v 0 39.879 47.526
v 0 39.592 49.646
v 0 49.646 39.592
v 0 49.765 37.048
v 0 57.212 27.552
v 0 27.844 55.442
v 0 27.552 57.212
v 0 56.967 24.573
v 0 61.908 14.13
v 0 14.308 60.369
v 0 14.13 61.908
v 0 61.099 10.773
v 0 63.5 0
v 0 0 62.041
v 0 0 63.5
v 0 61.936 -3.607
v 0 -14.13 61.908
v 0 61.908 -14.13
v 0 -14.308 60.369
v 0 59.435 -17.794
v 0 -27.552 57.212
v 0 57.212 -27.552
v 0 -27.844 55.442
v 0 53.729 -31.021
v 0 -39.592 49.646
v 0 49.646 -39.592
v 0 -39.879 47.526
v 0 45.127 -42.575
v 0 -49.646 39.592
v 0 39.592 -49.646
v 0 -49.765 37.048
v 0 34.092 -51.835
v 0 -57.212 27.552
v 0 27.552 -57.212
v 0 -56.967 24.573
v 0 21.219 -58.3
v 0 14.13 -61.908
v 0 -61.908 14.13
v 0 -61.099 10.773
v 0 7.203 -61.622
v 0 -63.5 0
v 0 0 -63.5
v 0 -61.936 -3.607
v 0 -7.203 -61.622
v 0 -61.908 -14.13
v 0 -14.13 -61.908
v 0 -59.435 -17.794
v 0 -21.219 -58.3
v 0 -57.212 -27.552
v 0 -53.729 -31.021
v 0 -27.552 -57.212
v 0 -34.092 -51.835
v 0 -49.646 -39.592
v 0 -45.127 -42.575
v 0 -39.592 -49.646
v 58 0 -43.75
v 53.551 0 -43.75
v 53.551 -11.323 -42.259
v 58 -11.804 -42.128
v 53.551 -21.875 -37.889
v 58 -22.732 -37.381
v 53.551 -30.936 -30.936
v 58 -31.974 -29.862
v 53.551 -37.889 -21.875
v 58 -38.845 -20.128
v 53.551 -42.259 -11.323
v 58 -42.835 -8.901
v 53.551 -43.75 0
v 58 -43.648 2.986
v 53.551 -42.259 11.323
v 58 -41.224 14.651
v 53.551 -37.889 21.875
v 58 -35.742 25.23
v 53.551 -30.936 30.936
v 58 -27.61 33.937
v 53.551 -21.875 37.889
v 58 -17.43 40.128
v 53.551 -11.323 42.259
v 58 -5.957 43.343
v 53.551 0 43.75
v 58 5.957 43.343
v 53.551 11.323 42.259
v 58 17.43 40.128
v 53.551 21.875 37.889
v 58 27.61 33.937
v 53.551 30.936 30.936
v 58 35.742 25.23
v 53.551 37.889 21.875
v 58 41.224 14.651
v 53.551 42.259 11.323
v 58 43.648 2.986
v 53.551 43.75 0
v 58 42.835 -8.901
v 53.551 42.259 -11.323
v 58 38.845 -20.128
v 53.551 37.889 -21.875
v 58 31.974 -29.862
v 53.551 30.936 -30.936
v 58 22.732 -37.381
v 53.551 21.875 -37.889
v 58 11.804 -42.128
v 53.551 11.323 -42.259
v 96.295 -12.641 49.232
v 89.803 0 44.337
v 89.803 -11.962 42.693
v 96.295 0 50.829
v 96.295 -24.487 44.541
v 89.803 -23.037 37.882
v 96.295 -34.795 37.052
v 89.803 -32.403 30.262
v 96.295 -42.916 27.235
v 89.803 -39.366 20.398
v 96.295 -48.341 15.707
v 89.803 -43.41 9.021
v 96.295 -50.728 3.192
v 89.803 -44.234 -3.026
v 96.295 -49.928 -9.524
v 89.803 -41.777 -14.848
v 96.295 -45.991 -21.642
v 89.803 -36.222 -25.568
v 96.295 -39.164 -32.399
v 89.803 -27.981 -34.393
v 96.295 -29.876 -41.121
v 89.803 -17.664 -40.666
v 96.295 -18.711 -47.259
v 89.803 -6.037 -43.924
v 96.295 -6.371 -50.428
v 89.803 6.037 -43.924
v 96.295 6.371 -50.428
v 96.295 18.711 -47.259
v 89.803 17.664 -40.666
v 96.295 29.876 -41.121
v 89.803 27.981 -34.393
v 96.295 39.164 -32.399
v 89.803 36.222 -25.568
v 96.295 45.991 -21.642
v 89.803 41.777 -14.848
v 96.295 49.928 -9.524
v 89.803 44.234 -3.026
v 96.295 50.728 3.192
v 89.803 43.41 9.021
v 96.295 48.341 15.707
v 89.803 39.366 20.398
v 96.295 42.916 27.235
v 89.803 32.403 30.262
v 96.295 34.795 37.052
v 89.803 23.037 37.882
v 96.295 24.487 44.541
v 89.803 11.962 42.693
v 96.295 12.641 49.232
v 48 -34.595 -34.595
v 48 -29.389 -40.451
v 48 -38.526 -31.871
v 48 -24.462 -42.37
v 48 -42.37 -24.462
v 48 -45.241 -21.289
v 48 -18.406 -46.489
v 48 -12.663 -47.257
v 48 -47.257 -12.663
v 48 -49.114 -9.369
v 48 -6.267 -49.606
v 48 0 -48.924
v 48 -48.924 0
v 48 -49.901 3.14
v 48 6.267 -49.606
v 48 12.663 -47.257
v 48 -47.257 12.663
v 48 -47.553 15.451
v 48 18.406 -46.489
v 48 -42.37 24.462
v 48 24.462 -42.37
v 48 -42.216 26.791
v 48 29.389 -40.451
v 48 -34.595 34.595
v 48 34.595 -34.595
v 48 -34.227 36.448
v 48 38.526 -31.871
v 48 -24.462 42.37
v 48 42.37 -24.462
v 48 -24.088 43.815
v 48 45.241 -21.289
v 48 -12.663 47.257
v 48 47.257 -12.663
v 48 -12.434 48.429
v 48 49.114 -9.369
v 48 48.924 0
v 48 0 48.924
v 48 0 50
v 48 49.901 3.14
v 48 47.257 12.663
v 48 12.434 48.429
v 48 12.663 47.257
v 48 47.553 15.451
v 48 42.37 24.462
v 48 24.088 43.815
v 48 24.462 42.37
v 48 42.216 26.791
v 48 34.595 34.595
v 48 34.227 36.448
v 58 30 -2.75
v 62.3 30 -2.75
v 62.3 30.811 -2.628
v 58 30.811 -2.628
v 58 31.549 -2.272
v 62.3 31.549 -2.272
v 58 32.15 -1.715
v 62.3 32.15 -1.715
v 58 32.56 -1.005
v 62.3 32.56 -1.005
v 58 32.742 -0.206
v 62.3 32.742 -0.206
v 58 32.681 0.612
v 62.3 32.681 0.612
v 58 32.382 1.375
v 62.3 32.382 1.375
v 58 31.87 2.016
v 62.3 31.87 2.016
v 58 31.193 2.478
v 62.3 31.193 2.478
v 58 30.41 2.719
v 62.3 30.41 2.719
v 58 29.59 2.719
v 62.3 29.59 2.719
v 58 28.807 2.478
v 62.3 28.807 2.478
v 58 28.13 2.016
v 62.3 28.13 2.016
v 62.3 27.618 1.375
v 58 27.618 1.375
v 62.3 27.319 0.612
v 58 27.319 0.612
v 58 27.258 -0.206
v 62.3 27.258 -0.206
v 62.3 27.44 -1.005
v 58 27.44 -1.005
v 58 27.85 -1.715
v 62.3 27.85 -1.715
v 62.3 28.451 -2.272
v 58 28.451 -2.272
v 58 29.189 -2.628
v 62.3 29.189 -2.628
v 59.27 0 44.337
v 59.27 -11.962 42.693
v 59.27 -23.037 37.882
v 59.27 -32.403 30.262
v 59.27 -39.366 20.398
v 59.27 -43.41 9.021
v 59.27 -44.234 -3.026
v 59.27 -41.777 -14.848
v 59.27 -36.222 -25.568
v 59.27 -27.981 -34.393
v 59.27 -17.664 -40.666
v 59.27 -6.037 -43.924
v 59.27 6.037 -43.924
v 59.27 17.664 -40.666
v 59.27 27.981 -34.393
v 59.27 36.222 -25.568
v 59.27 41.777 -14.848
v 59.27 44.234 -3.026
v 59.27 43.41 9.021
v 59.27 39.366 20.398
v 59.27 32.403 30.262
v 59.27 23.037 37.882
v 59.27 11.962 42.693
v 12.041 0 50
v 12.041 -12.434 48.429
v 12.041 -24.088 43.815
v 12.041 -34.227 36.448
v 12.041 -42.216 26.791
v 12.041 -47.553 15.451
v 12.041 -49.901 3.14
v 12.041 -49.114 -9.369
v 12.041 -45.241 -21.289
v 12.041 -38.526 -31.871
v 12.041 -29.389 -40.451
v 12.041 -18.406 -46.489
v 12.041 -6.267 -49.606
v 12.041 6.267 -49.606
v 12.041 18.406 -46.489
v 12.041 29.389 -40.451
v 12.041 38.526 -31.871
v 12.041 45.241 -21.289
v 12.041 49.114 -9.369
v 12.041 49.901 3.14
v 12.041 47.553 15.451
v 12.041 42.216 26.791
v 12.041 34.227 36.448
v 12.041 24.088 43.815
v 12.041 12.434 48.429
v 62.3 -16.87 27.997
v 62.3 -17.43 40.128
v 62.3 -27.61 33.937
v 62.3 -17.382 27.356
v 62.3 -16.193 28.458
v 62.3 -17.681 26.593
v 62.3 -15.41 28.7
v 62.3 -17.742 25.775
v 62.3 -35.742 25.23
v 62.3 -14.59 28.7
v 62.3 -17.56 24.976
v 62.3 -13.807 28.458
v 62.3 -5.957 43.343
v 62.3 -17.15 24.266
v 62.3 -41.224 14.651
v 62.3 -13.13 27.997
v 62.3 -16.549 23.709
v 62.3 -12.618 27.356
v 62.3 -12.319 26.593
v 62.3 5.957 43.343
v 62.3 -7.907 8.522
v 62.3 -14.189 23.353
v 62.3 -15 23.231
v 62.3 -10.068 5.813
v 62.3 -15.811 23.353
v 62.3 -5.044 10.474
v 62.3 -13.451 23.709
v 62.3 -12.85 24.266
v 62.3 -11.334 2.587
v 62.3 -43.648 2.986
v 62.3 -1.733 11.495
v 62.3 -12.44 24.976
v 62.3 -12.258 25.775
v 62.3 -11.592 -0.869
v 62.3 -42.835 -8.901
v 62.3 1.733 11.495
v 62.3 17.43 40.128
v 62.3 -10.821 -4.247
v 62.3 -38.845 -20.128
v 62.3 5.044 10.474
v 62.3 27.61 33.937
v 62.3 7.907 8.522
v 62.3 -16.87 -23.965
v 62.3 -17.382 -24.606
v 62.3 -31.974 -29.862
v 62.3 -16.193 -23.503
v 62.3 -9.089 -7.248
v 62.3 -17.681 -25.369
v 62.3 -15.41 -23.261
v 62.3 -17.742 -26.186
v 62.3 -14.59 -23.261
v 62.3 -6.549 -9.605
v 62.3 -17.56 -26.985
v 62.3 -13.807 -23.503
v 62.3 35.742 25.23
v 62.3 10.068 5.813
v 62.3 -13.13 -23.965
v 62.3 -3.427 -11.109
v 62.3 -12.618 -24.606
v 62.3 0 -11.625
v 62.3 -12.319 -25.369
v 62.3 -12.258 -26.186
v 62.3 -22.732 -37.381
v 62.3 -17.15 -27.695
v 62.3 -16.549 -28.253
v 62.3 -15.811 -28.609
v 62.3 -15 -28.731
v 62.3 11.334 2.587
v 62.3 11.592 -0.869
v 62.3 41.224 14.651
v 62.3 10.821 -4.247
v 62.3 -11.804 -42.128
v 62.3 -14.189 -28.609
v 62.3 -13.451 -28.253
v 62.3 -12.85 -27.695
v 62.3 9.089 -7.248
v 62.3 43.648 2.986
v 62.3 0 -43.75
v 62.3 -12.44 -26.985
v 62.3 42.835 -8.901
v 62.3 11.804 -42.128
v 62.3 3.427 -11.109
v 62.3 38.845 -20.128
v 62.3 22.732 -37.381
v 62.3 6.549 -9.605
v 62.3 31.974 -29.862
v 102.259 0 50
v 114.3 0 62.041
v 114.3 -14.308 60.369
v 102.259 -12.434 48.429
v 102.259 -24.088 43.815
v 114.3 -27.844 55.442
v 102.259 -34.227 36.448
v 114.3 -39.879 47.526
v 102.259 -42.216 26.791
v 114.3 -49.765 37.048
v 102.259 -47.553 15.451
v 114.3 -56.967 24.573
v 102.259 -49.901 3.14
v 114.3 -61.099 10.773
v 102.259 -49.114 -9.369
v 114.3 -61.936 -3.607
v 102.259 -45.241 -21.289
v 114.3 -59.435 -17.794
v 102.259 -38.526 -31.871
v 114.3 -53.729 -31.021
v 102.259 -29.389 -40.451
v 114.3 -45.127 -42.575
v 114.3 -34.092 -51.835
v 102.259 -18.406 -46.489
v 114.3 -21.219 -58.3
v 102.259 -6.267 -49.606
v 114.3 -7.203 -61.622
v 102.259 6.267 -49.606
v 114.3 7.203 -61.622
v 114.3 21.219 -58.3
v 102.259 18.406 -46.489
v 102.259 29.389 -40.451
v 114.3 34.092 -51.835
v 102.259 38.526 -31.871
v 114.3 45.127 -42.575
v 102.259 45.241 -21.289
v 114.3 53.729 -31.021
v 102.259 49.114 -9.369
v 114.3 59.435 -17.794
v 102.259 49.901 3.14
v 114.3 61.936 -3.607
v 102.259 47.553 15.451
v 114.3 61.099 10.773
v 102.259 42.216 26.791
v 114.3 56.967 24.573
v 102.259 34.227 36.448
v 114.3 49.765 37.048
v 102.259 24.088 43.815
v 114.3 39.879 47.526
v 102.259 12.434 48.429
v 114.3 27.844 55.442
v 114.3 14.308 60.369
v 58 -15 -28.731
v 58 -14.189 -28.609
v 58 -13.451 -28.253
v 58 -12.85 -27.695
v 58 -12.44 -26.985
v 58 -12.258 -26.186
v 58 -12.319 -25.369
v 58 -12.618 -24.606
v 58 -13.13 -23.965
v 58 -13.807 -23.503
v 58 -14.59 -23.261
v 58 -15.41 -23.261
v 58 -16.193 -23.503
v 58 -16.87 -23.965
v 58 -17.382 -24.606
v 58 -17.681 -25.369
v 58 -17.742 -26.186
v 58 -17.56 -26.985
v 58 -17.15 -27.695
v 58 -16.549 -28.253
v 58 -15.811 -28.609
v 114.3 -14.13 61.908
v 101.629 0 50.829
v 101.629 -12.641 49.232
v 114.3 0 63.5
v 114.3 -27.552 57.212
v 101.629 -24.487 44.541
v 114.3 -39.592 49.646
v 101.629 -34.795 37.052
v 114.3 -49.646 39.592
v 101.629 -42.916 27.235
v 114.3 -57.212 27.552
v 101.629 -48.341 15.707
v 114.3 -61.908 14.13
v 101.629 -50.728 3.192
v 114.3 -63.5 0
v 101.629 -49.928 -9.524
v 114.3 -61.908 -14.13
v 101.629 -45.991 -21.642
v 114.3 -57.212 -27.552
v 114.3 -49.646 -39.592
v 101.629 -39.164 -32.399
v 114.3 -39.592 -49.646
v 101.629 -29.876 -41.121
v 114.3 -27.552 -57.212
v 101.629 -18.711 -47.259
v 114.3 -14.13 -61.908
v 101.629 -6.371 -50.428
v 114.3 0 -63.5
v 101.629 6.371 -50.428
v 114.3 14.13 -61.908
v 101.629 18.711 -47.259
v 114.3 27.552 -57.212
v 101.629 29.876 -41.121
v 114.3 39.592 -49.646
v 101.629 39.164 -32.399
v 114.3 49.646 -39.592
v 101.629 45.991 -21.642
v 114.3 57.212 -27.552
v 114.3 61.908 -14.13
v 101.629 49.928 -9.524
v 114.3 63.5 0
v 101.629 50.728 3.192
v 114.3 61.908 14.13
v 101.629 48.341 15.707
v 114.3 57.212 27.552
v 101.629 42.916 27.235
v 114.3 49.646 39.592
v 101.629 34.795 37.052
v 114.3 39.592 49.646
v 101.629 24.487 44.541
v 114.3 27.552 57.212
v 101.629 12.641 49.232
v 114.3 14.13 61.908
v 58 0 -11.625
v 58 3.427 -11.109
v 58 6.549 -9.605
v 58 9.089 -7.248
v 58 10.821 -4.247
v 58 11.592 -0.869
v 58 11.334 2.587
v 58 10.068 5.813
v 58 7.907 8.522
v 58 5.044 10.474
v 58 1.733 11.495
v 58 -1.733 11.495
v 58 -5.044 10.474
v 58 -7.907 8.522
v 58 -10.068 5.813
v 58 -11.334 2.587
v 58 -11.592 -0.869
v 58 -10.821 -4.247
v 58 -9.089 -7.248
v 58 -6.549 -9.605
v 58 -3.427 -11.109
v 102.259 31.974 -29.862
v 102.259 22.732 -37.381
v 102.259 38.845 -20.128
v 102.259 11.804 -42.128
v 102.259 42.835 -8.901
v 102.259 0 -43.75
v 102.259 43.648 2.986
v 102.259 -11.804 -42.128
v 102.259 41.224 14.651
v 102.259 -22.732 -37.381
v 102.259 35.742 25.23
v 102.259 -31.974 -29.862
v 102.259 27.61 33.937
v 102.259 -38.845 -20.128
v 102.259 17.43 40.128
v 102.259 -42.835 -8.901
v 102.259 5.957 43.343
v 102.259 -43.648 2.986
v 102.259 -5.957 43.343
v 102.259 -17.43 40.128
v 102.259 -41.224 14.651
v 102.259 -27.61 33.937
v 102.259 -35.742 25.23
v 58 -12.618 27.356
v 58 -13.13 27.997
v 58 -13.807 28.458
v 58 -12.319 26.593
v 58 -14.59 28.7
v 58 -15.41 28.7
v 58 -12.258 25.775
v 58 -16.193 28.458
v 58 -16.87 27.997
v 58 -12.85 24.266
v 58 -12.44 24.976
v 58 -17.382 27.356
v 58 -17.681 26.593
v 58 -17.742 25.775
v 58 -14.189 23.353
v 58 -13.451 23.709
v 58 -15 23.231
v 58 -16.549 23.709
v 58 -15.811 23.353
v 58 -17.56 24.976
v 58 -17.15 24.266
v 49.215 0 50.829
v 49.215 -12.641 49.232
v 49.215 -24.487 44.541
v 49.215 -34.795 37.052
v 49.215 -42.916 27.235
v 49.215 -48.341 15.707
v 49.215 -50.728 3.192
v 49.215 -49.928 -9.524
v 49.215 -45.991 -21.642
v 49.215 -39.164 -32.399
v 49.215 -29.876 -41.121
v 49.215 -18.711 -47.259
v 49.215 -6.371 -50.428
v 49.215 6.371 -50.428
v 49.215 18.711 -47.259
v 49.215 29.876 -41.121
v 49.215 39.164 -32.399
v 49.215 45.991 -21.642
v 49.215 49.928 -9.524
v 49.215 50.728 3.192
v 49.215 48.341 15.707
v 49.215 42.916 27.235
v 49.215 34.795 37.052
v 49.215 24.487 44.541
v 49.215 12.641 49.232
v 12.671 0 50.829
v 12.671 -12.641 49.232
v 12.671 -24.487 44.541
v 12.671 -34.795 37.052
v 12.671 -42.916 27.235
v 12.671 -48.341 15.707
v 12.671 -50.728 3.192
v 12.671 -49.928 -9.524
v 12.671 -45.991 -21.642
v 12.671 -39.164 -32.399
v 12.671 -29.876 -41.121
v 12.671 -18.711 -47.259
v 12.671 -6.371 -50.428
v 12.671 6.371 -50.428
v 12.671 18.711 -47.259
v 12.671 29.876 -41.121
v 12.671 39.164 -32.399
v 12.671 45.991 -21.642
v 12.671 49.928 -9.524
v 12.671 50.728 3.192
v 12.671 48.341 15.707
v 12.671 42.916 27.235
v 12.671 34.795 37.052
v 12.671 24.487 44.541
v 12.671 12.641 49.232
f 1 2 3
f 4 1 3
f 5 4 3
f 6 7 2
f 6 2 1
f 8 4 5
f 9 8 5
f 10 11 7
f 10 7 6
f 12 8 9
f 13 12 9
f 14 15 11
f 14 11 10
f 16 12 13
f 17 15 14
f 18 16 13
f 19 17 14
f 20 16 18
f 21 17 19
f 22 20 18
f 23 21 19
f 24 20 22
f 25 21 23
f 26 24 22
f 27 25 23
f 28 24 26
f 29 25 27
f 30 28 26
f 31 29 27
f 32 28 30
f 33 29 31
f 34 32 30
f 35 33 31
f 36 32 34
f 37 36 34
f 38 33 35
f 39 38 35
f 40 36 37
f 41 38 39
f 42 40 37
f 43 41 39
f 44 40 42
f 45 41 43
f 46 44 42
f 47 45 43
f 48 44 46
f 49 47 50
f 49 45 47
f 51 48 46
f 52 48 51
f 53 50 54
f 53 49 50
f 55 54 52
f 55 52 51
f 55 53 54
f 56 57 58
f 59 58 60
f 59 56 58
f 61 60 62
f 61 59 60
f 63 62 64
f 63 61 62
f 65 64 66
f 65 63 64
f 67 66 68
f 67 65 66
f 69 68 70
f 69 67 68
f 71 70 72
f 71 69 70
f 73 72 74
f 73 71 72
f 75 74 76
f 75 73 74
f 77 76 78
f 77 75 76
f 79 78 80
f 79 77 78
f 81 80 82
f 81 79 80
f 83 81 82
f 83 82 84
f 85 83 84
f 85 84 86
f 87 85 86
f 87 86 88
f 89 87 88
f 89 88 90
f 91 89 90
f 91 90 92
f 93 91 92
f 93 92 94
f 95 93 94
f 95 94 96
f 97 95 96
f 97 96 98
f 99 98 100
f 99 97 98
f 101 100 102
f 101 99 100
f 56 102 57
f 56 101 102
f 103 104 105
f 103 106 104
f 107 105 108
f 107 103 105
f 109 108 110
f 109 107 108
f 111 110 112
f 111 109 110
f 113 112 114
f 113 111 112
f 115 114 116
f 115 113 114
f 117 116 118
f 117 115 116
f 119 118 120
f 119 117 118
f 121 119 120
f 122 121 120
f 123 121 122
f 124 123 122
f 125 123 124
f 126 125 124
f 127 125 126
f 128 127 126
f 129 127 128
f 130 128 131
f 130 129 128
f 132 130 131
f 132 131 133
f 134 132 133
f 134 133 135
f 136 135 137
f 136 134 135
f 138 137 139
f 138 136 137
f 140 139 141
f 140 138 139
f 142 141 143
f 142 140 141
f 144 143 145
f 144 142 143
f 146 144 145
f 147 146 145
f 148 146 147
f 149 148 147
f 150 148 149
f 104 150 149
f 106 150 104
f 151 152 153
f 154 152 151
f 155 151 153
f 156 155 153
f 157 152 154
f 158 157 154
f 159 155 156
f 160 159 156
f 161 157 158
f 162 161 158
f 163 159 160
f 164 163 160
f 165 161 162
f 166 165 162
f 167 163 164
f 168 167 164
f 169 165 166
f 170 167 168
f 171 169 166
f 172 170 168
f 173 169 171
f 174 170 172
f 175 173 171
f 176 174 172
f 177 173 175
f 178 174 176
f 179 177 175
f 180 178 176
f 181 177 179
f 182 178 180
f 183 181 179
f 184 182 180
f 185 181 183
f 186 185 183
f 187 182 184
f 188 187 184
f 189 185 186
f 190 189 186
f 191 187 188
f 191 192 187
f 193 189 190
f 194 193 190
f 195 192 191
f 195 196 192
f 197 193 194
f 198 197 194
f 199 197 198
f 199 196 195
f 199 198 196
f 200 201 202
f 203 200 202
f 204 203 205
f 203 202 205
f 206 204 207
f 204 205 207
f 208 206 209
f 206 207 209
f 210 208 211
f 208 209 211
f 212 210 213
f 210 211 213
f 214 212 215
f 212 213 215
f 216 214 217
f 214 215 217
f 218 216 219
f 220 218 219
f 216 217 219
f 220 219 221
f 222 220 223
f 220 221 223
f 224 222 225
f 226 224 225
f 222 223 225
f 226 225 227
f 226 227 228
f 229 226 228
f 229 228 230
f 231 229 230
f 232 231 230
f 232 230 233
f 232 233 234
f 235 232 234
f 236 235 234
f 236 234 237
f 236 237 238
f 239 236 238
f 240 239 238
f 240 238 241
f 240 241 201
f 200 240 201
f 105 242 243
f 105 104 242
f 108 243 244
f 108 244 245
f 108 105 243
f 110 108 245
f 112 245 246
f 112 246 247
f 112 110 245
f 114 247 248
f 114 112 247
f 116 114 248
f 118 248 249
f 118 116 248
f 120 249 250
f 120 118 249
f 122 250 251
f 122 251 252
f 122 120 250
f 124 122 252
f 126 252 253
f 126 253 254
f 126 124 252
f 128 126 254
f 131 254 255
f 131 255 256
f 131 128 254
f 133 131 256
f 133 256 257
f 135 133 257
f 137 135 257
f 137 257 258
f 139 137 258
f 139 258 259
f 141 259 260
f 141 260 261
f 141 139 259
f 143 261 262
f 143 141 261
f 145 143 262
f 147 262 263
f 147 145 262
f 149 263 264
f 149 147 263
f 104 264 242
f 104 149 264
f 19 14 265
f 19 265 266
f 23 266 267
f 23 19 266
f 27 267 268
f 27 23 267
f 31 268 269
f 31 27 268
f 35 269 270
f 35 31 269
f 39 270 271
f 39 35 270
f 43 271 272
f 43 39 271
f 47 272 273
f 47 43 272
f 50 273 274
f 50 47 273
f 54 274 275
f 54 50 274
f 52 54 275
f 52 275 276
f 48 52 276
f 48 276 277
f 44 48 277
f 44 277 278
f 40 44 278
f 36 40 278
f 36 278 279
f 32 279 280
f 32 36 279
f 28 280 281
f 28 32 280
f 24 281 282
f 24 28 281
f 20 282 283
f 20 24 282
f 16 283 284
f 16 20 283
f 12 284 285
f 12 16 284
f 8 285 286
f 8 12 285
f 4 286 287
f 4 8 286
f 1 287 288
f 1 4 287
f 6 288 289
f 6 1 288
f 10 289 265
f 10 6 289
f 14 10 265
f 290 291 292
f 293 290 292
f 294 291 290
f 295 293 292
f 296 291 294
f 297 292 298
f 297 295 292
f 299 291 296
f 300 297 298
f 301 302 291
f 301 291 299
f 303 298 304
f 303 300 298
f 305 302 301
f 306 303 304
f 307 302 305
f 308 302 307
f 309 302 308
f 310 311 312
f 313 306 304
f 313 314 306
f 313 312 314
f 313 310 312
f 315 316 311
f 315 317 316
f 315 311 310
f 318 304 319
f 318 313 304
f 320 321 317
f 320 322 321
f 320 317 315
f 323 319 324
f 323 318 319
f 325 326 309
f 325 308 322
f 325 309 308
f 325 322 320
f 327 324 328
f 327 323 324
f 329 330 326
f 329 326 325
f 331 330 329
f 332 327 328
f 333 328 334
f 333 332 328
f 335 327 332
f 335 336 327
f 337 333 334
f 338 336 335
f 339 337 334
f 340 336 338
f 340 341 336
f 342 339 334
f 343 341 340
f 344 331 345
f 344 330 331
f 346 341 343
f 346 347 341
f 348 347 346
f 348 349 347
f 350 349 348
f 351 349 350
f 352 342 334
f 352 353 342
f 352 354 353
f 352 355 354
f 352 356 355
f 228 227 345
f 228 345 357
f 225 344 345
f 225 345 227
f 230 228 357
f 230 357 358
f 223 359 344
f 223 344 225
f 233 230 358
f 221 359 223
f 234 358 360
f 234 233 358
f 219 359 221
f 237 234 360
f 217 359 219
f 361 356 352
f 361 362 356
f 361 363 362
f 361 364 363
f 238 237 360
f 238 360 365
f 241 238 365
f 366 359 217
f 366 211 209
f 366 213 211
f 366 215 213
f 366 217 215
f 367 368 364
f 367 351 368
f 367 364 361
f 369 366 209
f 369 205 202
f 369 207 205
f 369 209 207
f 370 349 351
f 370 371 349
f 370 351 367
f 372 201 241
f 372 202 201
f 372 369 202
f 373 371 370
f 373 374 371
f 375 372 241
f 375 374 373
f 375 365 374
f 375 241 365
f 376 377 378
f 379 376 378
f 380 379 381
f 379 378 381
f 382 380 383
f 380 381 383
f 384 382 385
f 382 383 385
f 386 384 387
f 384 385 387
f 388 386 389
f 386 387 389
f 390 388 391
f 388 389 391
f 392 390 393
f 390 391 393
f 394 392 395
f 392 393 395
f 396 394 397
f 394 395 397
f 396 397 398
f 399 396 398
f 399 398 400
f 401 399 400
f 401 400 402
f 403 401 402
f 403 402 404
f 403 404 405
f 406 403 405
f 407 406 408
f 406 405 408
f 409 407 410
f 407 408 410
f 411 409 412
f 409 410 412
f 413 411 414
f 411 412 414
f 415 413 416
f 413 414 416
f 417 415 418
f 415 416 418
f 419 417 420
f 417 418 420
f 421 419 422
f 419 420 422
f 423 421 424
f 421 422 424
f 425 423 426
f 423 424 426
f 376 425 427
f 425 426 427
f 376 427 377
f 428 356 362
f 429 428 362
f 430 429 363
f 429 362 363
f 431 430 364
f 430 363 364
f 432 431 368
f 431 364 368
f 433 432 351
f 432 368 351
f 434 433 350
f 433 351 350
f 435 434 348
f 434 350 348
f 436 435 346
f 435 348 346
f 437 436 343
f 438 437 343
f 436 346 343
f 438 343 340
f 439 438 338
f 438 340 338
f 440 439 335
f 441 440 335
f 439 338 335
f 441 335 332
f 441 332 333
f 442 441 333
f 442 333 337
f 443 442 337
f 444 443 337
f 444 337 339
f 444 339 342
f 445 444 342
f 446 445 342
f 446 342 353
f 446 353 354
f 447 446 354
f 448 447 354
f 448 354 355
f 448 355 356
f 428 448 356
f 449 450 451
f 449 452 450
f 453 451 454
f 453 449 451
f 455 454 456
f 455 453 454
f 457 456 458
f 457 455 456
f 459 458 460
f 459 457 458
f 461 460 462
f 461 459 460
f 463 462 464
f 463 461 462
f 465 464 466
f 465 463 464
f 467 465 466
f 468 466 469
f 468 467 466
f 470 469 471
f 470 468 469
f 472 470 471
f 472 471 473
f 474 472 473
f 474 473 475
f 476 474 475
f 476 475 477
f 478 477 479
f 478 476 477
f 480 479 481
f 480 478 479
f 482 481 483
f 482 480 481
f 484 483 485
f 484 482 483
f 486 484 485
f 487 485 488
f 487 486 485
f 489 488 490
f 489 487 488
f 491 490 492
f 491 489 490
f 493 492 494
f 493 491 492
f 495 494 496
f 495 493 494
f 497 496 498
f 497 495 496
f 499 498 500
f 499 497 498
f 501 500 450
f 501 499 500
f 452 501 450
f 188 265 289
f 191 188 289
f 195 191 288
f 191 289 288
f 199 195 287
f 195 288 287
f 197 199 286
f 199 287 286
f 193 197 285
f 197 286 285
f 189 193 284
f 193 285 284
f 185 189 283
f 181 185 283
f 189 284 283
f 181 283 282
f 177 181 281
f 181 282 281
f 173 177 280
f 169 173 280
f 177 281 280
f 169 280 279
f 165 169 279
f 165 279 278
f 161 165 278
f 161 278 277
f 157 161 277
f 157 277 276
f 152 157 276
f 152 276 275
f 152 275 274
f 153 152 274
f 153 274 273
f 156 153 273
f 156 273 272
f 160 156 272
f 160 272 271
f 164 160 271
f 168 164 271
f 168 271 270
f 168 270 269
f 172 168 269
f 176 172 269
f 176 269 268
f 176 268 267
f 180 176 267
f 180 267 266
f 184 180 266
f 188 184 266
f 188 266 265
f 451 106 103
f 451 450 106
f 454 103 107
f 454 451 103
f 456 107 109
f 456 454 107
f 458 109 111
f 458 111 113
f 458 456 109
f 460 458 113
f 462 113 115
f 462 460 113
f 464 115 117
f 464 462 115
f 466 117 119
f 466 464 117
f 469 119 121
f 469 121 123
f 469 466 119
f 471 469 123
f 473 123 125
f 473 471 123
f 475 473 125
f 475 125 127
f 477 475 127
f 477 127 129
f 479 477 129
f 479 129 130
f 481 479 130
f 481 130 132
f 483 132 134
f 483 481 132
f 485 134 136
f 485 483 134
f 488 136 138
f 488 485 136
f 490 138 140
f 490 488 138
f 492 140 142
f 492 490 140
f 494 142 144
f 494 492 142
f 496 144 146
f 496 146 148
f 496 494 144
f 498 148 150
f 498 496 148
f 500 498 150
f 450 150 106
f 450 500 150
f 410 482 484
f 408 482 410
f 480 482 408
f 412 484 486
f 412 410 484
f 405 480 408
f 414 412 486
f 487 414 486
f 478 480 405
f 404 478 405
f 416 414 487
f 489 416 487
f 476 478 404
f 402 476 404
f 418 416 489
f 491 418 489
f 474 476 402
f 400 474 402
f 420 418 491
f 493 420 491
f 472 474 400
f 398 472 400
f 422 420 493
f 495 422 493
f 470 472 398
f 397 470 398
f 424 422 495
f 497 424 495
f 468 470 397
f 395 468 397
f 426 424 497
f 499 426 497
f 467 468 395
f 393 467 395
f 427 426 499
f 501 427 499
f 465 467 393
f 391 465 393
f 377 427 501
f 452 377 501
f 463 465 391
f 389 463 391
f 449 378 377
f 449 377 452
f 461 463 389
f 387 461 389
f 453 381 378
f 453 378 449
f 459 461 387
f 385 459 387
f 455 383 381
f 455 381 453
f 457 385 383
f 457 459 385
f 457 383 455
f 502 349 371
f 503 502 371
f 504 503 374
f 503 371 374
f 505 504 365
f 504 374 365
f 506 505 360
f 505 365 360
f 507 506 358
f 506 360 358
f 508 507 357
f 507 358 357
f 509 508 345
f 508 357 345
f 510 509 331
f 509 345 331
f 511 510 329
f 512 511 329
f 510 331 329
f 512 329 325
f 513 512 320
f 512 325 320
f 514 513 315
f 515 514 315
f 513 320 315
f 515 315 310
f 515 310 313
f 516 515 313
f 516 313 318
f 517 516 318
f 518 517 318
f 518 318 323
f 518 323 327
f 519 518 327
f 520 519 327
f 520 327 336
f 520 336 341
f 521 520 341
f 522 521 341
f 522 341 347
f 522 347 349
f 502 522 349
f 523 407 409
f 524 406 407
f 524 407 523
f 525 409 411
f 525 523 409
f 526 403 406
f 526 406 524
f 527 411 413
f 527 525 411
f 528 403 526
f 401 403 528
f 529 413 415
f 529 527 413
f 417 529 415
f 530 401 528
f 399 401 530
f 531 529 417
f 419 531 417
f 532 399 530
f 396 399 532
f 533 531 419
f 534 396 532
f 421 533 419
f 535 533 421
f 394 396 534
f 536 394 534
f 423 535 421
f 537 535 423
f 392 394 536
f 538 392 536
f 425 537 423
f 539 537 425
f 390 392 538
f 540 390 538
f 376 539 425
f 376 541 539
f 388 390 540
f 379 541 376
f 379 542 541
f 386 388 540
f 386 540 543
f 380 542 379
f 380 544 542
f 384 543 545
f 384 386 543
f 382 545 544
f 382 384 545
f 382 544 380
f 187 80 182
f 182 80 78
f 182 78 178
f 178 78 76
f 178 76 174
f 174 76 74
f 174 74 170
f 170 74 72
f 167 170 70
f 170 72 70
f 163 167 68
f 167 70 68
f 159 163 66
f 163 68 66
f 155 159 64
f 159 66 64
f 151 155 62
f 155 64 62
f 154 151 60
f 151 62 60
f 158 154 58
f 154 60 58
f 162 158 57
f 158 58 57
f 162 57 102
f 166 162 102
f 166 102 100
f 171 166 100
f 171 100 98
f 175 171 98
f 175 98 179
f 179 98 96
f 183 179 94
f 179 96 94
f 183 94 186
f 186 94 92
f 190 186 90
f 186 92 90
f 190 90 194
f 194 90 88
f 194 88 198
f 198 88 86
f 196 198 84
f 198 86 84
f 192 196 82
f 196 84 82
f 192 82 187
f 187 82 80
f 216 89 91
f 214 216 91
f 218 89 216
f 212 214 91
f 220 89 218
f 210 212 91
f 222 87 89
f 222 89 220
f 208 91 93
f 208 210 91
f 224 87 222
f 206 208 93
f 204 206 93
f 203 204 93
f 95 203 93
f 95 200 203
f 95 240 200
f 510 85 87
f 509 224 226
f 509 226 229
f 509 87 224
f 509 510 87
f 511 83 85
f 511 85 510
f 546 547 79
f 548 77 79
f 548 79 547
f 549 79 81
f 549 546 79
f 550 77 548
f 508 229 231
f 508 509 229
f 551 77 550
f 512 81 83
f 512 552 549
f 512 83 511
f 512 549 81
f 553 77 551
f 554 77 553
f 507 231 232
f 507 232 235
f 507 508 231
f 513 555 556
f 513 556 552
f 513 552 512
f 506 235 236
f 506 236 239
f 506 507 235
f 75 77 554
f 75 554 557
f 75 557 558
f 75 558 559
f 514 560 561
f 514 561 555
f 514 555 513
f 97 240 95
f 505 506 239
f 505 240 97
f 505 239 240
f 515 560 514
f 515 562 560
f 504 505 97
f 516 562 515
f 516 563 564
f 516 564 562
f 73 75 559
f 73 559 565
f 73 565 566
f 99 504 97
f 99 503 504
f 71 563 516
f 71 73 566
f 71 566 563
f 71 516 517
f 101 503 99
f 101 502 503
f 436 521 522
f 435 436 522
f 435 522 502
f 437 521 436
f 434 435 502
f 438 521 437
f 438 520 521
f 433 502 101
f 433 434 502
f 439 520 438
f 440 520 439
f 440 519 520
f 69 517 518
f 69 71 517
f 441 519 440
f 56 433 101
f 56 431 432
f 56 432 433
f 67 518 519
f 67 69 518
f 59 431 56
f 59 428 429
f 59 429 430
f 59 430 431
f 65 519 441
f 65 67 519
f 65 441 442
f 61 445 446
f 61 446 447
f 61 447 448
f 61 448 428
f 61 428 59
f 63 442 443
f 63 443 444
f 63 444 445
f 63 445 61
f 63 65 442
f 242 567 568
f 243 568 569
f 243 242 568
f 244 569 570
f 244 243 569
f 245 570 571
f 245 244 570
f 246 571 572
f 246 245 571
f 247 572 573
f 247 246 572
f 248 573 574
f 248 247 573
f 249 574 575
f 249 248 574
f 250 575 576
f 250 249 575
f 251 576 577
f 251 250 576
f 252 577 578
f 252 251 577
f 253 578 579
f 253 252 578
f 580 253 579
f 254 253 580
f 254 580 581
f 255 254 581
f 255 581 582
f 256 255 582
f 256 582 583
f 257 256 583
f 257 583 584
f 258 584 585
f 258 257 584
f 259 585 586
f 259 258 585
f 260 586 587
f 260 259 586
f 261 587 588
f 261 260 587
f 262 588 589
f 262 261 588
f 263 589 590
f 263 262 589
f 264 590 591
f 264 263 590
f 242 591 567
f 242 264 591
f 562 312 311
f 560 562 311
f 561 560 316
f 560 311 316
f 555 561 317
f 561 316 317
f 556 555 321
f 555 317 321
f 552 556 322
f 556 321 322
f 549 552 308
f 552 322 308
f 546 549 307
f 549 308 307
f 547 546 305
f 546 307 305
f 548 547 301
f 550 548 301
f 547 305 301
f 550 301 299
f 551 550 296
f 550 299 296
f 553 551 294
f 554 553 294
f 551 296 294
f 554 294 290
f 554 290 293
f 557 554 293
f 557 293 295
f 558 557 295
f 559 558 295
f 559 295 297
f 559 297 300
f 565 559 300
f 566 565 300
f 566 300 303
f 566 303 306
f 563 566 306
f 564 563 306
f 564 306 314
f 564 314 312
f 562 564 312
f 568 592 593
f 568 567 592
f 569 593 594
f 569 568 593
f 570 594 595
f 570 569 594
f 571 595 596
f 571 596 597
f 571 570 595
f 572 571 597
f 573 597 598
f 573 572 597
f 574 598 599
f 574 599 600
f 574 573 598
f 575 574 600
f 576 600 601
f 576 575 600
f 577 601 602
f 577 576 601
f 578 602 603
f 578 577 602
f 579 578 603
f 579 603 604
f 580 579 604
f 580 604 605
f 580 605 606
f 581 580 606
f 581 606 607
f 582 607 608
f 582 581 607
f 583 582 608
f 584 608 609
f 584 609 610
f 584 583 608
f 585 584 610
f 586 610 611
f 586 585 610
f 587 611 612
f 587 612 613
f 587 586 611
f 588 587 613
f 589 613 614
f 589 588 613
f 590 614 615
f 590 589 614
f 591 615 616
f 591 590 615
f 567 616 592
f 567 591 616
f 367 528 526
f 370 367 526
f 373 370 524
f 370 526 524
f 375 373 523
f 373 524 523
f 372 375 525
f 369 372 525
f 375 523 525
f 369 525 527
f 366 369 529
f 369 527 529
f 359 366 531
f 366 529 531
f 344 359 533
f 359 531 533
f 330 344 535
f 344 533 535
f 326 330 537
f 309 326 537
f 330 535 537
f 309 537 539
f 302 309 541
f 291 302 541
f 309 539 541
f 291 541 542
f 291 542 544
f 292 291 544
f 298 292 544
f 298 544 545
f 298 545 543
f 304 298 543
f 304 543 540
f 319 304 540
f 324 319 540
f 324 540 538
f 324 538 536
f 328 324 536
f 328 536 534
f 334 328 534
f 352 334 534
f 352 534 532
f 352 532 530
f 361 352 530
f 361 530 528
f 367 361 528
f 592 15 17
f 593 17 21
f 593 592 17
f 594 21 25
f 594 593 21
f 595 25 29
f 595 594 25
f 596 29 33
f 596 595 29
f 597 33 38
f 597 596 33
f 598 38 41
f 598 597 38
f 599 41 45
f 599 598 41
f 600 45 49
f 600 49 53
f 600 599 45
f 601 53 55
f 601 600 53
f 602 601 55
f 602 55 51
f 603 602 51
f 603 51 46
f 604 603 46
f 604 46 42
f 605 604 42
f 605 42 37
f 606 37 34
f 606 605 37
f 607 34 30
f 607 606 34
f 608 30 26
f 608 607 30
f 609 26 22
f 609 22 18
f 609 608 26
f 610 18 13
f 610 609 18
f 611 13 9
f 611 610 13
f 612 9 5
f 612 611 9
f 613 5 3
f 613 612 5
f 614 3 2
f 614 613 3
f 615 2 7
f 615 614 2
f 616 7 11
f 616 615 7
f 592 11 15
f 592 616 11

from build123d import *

# Parameters (mm, degrees)
SKETCH3_R          = 50
CUT_EXTRUDE1_DEPTH = 48
SKETCH4_R          = 43.75
CUT_EXTRUDE2_DEPTH = 52
CUT_EXTRUDE3_START = -10
SKETCH7_R          = 43.75
CUT_EXTRUDE3_DEPTH = 10
SKETCH8_R          = 11.625
SKETCH8_R_2        = 2.75
CUT_EXTRUDE4_DEPTH = 10


with BuildPart() as part:
    # Sketch2 → Revolve1 (revolve)
    with BuildSketch(Plane.XY, mode=Mode.PRIVATE) as revolve1_sk:
        Polygon((0, 0), (0, 63.5), (12.671353519, 50.828646481), (49.214586006, 50.828646481), (59.270211662, 44.337039427), (89.802920415, 44.337039427), (96.294527469, 50.828646481), (101.628646481, 50.828646481), (114.3, 63.5), (114.3, 0), align=None)
    revolve(revolve1_sk.sketch.rotate(Axis((0, 0, 0), (1, 0, 0)), 90), axis=Axis((0, 0, 0), (1, 0, 0)))

    # Sketch3 → Cut-Extrude1 (cut)
    with BuildSketch(Plane.ZY):
        Circle(SKETCH3_R)
    extrude(amount=-CUT_EXTRUDE1_DEPTH, mode=Mode.SUBTRACT)

    # Sketch4 → Cut-Extrude2 (cut)
    with BuildSketch(Plane(origin=(114.3, 0, 0), x_dir=(0, 0, -1), z_dir=(1, 0, 0))):
        Circle(SKETCH4_R)
    extrude(amount=-CUT_EXTRUDE2_DEPTH, mode=Mode.SUBTRACT)

    # Sketch5 → Cut-Revolve1 (revolve, cut)
    with BuildSketch(Plane.XY, mode=Mode.PRIVATE) as cut_revolve1_sk:
        Polygon((12.041253289, 50), (-0.277777226, 62.319030515), (-0.277777226, 50), align=None)
        Polygon((114.577777226, 62.319030515), (114.577777226, 50), (114.577777226, 45.7969371), (114.577777226, 42.174166746), (102.258746711, 42.174166746), (102.258746711, 45.7969371), (102.258746711, 50), align=None)
    revolve(cut_revolve1_sk.sketch.rotate(Axis((0, 0, 0), (1, 0, 0)), 90), axis=Axis((0, 0, 0), (1, 0, 0)), mode=Mode.SUBTRACT)

    # Sketch6 → Cut-Revolve2 (revolve, cut)
    with BuildSketch(Plane.XY, mode=Mode.PRIVATE) as cut_revolve2_sk:
        Polygon((55.706193059, 41.74129726), (47.124944427, 41.74129726), (47.124944427, 49.73979372), align=None)
    revolve(cut_revolve2_sk.sketch.rotate(Axis((0, 0, 0), (1, 0, 0)), 90), axis=Axis((0, 0, 0), (1, 0, 0)), mode=Mode.SUBTRACT)

    # Sketch7 → Cut-Extrude3 (cut)
    with BuildSketch(Plane.ZY.offset(-48).offset(CUT_EXTRUDE3_START)):
        with Locations(Location((0, 0, 0), (0, 0, 180))):
            Circle(SKETCH7_R)
    extrude(amount=CUT_EXTRUDE3_DEPTH, mode=Mode.SUBTRACT)

    # Sketch8 → Cut-Extrude4 (cut)
    with BuildSketch(Plane(origin=(62.3, 0, 0), x_dir=(0, 0, -1), z_dir=(1, 0, 0))):
        Circle(SKETCH8_R)
        with Locations((0, 30)):
            Circle(SKETCH8_R_2)
        with Locations((25.980762114, -15)):
            Circle(SKETCH8_R_2)
        with Locations((-25.980762114, -15)):
            Circle(SKETCH8_R_2)
    extrude(amount=-CUT_EXTRUDE4_DEPTH, mode=Mode.SUBTRACT)


solid = part.part
